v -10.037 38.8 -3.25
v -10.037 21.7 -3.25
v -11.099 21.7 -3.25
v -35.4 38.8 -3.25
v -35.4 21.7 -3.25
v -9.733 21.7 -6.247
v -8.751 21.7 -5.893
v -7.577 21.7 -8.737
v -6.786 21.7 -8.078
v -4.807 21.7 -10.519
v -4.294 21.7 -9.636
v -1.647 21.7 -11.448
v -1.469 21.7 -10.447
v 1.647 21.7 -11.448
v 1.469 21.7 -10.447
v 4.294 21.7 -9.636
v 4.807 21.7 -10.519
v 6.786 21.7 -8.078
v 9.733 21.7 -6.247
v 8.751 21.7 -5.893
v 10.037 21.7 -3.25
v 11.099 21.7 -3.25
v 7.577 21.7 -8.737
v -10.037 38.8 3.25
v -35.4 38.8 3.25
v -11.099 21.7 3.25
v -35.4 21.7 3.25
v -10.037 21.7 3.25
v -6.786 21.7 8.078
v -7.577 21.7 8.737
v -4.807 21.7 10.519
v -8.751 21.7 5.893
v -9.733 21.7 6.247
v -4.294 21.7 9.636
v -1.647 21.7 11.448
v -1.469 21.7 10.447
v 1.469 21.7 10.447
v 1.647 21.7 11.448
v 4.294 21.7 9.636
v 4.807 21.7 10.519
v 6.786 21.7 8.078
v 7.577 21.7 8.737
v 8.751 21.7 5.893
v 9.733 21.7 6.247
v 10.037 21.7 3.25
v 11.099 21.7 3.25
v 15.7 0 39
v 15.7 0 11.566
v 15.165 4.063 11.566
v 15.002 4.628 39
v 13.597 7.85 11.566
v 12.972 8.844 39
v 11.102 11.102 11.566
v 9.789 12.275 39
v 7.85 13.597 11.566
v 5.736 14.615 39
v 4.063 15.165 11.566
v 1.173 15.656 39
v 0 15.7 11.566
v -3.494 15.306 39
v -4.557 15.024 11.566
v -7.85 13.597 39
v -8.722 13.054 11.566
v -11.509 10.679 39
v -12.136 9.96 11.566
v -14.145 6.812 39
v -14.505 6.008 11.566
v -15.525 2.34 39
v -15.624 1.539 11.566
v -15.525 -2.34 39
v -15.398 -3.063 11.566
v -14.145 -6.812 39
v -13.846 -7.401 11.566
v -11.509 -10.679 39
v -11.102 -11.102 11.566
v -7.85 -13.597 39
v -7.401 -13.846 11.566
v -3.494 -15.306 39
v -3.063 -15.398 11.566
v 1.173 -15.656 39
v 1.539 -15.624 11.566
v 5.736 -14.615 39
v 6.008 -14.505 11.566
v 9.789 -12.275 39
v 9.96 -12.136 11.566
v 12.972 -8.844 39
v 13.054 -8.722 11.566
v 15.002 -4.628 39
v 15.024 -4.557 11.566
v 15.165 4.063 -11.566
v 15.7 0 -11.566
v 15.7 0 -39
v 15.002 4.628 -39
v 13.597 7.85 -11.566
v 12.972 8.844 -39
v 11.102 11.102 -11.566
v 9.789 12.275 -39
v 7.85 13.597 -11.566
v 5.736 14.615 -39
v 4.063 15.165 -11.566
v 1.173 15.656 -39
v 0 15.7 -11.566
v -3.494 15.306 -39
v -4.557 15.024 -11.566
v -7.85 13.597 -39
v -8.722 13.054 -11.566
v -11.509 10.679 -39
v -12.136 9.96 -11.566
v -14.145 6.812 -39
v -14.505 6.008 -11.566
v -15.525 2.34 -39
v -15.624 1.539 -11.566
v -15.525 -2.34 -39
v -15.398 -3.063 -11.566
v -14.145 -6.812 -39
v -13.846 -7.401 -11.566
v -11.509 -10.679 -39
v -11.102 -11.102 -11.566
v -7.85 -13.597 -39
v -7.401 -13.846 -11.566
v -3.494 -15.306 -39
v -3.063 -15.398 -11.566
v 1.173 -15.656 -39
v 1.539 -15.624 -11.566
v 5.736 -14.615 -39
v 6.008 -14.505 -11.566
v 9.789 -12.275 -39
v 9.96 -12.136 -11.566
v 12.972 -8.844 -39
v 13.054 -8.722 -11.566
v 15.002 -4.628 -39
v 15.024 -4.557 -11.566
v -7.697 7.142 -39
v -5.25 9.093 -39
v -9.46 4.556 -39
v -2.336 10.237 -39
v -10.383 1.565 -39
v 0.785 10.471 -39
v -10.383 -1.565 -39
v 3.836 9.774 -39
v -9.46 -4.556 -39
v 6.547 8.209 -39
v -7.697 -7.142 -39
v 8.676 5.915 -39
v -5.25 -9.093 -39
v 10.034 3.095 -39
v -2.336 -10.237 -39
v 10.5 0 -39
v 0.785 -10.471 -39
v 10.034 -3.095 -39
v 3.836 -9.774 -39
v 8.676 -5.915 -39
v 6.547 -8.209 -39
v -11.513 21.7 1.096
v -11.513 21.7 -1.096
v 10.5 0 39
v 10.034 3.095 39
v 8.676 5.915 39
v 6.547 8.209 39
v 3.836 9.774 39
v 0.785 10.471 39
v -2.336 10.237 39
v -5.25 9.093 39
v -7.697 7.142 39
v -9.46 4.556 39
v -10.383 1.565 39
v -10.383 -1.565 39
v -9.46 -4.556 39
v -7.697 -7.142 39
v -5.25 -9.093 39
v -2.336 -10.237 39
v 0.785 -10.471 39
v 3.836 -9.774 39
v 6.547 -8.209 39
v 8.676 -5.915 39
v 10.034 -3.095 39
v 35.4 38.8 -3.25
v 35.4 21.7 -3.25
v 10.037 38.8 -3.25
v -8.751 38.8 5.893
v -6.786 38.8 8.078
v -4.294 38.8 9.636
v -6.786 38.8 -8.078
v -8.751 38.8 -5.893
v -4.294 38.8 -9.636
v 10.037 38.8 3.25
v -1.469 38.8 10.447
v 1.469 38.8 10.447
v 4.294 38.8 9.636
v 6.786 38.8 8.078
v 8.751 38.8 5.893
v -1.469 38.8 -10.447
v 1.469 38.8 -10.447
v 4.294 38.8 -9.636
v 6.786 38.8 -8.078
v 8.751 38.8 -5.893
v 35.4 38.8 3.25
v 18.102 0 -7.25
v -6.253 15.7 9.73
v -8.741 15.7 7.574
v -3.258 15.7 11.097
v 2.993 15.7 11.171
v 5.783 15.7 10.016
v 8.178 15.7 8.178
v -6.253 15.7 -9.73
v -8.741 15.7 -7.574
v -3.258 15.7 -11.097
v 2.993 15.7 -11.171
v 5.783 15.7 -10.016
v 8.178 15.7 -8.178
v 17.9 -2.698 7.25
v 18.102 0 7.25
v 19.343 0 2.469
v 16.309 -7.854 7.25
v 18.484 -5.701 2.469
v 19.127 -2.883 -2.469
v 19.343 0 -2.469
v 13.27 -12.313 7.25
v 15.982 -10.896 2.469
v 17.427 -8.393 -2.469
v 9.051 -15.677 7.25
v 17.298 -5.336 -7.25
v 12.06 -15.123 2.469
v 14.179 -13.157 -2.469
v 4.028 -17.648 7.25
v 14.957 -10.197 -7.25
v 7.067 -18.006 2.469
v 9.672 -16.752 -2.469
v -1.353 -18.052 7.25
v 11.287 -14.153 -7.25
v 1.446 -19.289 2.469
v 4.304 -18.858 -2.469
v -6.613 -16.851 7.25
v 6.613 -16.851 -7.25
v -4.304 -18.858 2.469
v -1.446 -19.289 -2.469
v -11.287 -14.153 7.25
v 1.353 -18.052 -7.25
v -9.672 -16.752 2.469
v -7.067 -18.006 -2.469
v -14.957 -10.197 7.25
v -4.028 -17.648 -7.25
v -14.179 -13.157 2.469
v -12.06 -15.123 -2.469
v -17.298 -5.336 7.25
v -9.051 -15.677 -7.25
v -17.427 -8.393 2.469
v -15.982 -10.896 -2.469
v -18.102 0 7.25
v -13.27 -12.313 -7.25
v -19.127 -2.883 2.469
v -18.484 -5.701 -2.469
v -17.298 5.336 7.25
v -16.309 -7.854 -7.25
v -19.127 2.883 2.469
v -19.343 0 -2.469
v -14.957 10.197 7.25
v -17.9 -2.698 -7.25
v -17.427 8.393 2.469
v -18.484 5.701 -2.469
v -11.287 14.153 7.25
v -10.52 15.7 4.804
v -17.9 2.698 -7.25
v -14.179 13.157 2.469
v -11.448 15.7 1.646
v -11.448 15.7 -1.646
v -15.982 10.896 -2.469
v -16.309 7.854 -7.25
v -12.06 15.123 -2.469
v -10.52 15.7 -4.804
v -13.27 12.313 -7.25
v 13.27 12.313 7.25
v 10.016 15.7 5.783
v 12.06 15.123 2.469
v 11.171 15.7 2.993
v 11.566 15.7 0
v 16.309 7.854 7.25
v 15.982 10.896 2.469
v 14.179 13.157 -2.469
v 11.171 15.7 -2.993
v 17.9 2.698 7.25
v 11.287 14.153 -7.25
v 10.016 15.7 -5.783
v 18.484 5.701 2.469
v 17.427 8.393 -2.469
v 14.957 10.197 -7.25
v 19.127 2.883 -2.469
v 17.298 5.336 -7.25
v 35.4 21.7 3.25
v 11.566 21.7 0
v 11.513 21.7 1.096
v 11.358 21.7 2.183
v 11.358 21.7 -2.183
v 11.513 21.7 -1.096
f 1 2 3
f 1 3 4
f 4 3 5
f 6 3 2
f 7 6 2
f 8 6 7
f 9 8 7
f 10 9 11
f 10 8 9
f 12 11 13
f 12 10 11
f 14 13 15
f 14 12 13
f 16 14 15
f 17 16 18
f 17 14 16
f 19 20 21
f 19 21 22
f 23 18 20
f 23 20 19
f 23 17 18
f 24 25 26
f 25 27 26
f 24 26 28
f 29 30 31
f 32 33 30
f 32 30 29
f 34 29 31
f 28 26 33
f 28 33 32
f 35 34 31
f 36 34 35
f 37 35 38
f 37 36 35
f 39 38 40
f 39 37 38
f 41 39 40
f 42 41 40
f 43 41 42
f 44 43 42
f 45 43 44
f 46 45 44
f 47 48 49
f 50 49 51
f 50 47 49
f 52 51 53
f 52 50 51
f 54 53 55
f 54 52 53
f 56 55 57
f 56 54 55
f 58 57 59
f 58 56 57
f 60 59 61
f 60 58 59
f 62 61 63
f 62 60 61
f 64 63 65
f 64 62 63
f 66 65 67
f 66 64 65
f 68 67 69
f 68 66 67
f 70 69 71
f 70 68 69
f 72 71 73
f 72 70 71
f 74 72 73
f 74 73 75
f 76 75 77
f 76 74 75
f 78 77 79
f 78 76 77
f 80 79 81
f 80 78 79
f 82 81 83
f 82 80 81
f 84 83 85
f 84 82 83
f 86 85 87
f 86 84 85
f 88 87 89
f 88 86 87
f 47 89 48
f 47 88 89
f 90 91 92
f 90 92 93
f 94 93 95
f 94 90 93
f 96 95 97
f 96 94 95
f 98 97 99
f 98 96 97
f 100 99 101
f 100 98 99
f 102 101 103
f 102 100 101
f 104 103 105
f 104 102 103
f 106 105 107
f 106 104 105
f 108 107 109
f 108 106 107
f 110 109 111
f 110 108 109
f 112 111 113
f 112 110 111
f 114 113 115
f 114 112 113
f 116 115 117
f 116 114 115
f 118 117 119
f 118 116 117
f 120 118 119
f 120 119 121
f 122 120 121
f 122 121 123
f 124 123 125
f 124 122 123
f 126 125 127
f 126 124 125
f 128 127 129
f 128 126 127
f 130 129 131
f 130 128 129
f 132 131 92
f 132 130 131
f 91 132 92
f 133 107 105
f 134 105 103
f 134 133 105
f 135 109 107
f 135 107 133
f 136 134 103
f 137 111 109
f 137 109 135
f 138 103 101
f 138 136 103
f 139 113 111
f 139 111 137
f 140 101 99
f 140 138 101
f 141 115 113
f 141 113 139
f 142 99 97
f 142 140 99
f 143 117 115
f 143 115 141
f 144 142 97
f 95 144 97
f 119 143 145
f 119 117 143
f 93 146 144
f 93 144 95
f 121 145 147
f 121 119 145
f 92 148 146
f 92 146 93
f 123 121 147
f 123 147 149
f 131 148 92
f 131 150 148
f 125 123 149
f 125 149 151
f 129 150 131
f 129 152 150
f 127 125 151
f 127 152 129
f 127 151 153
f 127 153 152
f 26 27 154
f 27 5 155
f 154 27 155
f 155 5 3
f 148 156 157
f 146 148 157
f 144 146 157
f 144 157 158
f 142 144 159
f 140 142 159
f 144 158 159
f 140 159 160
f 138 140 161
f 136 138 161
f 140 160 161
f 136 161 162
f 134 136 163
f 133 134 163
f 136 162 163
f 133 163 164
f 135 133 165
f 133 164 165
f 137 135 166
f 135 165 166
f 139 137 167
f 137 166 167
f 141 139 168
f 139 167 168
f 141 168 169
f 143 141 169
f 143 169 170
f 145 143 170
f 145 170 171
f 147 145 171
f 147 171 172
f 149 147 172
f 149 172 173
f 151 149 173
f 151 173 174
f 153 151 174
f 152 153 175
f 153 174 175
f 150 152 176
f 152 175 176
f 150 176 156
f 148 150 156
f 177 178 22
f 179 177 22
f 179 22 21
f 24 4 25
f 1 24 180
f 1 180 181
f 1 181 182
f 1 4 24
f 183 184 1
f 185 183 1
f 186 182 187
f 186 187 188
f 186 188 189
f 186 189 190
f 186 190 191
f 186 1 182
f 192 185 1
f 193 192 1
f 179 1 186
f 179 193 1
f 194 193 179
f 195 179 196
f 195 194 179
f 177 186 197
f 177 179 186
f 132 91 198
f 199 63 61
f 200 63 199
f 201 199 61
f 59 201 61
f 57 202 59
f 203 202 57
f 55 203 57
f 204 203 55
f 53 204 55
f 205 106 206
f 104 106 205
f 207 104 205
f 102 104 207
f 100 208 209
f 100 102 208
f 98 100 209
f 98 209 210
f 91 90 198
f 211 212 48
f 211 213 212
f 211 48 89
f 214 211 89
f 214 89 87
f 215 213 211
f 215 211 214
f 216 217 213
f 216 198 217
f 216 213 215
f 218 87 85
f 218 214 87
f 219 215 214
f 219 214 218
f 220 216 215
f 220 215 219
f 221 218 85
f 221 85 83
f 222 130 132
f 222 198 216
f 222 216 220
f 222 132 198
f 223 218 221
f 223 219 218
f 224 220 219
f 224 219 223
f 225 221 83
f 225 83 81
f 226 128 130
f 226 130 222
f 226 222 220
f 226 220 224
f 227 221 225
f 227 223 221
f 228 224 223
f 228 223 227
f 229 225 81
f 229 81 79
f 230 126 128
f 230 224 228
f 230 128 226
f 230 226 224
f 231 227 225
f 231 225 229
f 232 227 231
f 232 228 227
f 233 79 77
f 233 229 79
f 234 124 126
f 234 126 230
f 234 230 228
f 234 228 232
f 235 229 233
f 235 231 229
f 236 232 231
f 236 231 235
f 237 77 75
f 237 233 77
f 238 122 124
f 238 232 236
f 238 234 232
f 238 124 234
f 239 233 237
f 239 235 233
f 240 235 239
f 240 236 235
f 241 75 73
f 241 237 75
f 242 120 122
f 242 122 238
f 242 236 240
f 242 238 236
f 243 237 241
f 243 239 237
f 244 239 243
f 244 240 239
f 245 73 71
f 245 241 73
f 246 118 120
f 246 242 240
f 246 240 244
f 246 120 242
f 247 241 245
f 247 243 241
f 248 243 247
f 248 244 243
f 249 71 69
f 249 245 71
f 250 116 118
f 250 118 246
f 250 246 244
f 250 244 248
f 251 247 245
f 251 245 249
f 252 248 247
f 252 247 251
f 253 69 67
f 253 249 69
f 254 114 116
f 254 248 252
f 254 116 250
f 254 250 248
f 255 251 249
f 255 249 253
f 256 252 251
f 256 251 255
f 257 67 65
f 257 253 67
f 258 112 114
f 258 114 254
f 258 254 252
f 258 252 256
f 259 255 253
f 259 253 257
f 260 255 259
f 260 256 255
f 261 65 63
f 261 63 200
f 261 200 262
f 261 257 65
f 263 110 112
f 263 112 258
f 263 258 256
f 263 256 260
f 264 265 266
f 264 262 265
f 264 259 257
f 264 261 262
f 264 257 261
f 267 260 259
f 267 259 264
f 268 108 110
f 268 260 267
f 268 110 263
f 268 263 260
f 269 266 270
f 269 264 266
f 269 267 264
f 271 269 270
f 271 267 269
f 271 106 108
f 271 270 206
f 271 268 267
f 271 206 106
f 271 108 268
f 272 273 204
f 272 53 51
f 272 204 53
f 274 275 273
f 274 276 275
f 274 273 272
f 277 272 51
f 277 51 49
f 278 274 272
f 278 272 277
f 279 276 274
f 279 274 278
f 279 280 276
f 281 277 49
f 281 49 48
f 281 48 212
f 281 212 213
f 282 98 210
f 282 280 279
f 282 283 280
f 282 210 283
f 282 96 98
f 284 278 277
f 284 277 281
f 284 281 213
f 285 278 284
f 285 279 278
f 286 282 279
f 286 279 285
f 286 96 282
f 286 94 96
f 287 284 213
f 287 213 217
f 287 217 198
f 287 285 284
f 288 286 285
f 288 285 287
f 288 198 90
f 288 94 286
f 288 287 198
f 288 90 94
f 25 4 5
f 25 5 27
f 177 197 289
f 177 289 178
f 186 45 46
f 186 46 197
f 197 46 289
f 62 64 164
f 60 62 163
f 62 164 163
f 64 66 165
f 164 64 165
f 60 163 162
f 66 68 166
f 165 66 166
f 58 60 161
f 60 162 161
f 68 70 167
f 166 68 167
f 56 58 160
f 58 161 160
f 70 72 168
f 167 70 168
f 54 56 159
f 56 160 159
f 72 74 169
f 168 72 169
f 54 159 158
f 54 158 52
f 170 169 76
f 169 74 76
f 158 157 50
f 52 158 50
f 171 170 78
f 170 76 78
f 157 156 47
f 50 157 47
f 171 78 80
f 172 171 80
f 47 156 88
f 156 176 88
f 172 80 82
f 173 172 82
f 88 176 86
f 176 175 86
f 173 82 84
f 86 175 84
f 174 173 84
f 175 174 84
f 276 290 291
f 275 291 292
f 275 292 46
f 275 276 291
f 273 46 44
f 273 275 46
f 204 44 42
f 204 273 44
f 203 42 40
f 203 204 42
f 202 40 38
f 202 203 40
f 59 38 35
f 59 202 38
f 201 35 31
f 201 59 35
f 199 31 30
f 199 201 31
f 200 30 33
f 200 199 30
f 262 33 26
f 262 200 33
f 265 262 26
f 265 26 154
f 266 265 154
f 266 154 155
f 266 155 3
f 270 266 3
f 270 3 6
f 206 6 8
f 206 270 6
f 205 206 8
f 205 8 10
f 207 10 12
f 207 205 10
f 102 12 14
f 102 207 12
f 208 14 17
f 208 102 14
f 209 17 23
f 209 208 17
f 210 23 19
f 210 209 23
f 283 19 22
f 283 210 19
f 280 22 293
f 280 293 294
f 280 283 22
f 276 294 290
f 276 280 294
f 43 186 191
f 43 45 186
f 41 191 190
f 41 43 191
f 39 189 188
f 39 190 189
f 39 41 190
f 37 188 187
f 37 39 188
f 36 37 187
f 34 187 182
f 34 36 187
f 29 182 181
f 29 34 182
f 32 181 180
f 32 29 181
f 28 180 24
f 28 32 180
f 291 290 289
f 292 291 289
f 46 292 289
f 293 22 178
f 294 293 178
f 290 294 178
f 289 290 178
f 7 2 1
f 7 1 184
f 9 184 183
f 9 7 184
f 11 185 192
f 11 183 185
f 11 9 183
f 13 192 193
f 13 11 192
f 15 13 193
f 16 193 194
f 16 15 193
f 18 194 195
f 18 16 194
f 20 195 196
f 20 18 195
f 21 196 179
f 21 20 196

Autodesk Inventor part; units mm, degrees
ref_plane "YZ Plane" through (0, 0, 0) normal (1, 0, 0) x (0, 1, 0)
ref_plane "XY Plane" through (0, 0, 0) normal (0, 0, 1) x (1, 0, 0)
sketch "Sketch1" plane through (0, 0, 0) normal (0, 1, 0) x (-1, 0, 0)
  line L0 (0, 0) -> (0, -39)
  line L1 (0, -39) -> (-15.7, -39)
  line L2 (-15.7, 39) -> (0, 39)
  line L3 (0, 39) -> (0, 0)
  arc A0 (-15.7, 11.5655) -> (-15.7, -11.5655) centre (0, 0) ccw
  line L4 (-15.7, -39) -> (-15.7, -11.5655)
  line L5 (-15.7, 11.5655) -> (-15.7, 39)
  dimension "d0" = 39
  dimension "d1" = 15.7
  dimension "d2" = 78
  dimension "d3" = 39
revolve "Revolution1" add sketch "Sketch1" angle 360 about axis through (0, 0, 0) along (0, 0, -1)
ref_plane "Work Plane1" through (0, 15.7, 25.2827) normal (0, 1, 0) x (-1, 0, 0)
split "Split1" plane through (0, 15.7, 25.2827) removes the side toward (0, 1, 0)
sketch "Sketch2" plane through (0, 15.7, 0) normal (0, 1, 0) x (1, 0, 0)
  circle A0 centre (0, 0) radius 11.5655
  line L0 (15.7, 11.5655) -> (-15.7, 11.5655) projected
  point P0 (0, 11.5655)
extrude "Extrusion1" add sketch "Sketch2" along normal blind 6
sketch "Sketch3" plane through (0, 0, 39) normal (0, 0, 1) x (1, 0, 0)
  circle A0 centre (0, 0) radius 10.5
  dimension "d7" = 21
extrude "Extrusion2" cut sketch "Sketch3" against normal blind 78
thread "Thread1" size "M22x3" class "6H" standard "ANSI Metric M Profile" full length
sketch "Sketch4" plane through (0, 21.7, 0) normal (0, 1, 0) x (1, 0, 0)
  line L0 (35.4, -3.25) -> (35.4, 3.25)
  line L1 (-35.4, 3.25) -> (-35.4, -3.25)
  line L2 (35.4, 3.25) -> (10.0369, 3.25)
  line L3 (-10.0369, 3.25) -> (-35.4, 3.25)
  line L4 (-35.4, -3.25) -> (-10.0369, -3.25)
  line L5 (10.0369, -3.25) -> (35.4, -3.25)
  arc A0 (-10.0369, -3.25) -> (10.0369, -3.25) centre (0, 0) ccw
  arc A1 (10.0369, 3.25) -> (-10.0369, 3.25) centre (0, 0) ccw
  dimension "d12" = 70.8
  dimension "d13" = 6.5
extrude "Extrusion3" add sketch "Sketch4" along normal blind 17.1
properties part number "LlaveDesecho"
